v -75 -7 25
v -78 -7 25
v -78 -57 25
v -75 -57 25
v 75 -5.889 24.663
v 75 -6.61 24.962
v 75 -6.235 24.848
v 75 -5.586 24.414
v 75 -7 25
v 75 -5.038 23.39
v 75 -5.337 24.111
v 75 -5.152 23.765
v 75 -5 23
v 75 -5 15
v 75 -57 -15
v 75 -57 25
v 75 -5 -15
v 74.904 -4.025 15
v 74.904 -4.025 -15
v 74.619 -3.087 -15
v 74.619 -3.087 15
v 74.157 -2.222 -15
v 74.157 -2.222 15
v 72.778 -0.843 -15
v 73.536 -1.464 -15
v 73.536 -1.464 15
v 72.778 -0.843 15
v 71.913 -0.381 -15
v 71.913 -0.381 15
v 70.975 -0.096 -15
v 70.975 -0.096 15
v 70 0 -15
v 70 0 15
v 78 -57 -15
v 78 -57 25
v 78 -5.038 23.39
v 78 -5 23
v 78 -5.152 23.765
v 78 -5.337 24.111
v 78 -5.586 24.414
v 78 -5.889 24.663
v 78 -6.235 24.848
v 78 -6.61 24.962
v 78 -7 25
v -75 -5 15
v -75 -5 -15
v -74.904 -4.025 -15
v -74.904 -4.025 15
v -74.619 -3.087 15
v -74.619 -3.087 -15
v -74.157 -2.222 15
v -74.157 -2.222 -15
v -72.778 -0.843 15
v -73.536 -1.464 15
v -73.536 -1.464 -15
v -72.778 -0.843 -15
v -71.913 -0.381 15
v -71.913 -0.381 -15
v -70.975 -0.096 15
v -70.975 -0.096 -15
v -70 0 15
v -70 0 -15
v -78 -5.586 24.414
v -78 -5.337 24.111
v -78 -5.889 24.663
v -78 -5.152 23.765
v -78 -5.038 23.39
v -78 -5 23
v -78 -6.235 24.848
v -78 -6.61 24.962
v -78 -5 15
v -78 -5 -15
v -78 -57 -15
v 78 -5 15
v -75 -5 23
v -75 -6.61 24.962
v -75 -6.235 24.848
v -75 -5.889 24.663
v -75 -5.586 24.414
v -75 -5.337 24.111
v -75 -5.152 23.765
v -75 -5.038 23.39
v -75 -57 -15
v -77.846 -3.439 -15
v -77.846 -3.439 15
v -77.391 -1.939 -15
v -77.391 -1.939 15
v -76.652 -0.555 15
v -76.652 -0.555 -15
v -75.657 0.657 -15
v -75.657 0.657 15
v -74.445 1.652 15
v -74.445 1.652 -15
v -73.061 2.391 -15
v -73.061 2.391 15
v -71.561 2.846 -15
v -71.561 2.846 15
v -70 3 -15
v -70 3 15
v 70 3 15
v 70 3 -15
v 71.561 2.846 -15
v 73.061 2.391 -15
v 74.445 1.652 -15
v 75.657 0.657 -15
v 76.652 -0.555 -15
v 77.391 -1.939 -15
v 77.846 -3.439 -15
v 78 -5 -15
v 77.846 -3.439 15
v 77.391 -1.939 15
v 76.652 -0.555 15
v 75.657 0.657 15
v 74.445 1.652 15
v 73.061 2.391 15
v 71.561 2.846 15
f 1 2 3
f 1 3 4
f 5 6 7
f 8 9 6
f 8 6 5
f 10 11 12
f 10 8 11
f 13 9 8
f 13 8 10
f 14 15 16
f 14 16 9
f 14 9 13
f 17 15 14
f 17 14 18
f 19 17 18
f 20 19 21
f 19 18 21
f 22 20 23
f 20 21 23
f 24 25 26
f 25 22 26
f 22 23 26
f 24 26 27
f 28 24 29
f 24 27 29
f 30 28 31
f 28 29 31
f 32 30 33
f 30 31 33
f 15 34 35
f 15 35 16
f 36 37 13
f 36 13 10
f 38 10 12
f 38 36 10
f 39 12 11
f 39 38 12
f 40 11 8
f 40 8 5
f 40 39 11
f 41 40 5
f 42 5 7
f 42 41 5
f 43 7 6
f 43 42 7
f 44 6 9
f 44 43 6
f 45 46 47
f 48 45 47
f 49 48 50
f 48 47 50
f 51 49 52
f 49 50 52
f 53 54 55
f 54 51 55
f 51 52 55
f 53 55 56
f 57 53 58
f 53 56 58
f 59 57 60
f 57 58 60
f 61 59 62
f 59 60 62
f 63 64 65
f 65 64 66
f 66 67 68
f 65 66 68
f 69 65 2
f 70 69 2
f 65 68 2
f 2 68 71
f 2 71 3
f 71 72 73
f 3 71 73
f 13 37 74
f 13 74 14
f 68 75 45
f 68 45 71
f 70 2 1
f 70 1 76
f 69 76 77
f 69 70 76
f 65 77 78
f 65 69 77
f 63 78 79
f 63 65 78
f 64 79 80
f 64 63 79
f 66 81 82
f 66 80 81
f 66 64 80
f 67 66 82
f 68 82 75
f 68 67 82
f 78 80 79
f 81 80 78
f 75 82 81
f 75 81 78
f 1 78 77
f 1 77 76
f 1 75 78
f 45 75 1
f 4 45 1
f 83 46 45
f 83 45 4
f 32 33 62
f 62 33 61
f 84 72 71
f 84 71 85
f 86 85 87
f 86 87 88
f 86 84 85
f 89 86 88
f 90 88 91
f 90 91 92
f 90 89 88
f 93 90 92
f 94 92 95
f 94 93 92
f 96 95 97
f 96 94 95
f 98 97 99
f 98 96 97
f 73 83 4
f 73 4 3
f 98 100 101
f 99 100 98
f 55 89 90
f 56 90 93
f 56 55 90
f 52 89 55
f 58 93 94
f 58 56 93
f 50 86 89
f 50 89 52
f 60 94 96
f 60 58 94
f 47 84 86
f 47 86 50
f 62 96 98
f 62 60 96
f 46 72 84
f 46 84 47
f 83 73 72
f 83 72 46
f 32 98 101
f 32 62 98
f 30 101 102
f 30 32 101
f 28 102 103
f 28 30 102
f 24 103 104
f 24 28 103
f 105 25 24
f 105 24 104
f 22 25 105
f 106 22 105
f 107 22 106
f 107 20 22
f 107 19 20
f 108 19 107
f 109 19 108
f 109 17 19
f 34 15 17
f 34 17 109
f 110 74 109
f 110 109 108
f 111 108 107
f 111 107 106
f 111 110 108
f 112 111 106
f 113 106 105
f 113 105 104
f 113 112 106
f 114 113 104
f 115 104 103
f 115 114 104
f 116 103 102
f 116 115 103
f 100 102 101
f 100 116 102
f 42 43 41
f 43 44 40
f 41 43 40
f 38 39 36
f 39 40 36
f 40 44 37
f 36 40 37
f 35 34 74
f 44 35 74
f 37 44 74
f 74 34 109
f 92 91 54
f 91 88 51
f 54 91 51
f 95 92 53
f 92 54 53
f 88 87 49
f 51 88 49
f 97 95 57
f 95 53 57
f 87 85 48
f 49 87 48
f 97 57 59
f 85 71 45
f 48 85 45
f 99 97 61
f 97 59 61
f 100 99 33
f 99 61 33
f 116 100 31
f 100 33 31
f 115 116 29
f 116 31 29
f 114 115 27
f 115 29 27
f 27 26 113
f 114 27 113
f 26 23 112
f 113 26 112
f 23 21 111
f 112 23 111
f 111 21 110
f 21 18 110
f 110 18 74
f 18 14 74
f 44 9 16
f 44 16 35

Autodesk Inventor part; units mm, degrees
ref_plane "YZ Plane" through (0, 0, 0) normal (1, 0, 0) x (0, 1, 0)
ref_plane "XZ Plane" through (0, 0, 0) normal (0, 1, 0) x (-1, 0, 0)
ref_plane "XY Plane" through (0, 0, 0) normal (0, 0, 1) x (1, 0, 0)
sketch "Sketch1" plane through (0, 0, 0) normal (0, 1, 0) x (-1, 0, 0)
  line L0 (78, 15) -> (-78, 15)
  line L1 (-78, 15) -> (-78, -15)
  line L2 (-78, -15) -> (78, -15)
  line L3 (78, -15) -> (78, 15)
  line L4 (78, 15) -> (-78, -15) construction
  line L5 (-78, 15) -> (78, -15) construction
  point P0 (0, 0)
  dimension "d37" = 156
  dimension "d38" = 30
extrude "Plate1" add sketch "Sketch1" along normal blind 3
sketch "Sketch4" plane through (-75, 3, -15) normal (-1, 0, 0) x (0, -1, 0)
  line L0 (0, 30) -> (0, 0)
  line L1 (0, 0) -> (60, 0)
  line L2 (60, 0) -> (60, 30)
  line L3 (60, 30) -> (0, 30)
edge flange "Flange1" height 60 angle 90 thickness 3 bend radius 5 thickness toward (-1, 0, 0) relief round relief width 3 relief depth 1.5 corner gap 5 corner form 0 edges at (-78, 0, 0) (78, 0, 0) wall of the first edge with corners at (-75, 3, 15) (-75, 3, -15) (-75, -57, -15) (-75, -57, 15)
bend "Bend1"
corner "Corner1"
sketch "Sketch5" plane through (-78, -57, 15) normal (0, 0, 1) x (1, 0, 0)
  line L0 (3, 52) -> (0, 52) projected
  line L1 (0, 52) -> (0, 0) projected
  line L2 (3, 0) -> (0, 0) projected
  line L3 (3, 52) -> (3, 0) projected
  point P0 (78, 57)
extrude "Extrusion2" add sketch "Sketch5" along normal blind 10
mirror "Mirror1" about plane through (0, 0, 0) normal (1, 0, 0) of "Extrusion2"
fillet "Fillet1" radius 2 2 edges at (76.5, -5, 25) (-76.5, -5, 25)
equation "\"d6\" = Thickness"
equation "\"d39\" = BendReliefWidth"
equation "\"d40\" = BendReliefDepth"
equation "\"d41\" = MinimumRemnant"
equation "\"d42\" = TransitionRadius"
equation "\"d45\" = BendRadius"
equation "\"d46\" = CornerReliefSize"
equation "\"d47\" = GapSize"
equation "\"d48\" = JacobiRadiusSize"
equation "\"BendReliefWidth\" = Thickness"
equation "\"BendReliefDepth\" = 0.5 * Thickness"
equation "\"CornerReliefSize\" = 4 * Thickness"
equation "\"MinimumRemnant\" = 2 * Thickness"
equation "\"TransitionRadius\" = BendRadius"
equation "\"JacobiRadiusSize\" = BendRadius"
equation "\"GapSize\" = Thickness"
equation "\"Thickness\" = 3"
equation "\"BendRadius\" = 5"
properties part number "MSC 923 step" material "Stainless Steel"
